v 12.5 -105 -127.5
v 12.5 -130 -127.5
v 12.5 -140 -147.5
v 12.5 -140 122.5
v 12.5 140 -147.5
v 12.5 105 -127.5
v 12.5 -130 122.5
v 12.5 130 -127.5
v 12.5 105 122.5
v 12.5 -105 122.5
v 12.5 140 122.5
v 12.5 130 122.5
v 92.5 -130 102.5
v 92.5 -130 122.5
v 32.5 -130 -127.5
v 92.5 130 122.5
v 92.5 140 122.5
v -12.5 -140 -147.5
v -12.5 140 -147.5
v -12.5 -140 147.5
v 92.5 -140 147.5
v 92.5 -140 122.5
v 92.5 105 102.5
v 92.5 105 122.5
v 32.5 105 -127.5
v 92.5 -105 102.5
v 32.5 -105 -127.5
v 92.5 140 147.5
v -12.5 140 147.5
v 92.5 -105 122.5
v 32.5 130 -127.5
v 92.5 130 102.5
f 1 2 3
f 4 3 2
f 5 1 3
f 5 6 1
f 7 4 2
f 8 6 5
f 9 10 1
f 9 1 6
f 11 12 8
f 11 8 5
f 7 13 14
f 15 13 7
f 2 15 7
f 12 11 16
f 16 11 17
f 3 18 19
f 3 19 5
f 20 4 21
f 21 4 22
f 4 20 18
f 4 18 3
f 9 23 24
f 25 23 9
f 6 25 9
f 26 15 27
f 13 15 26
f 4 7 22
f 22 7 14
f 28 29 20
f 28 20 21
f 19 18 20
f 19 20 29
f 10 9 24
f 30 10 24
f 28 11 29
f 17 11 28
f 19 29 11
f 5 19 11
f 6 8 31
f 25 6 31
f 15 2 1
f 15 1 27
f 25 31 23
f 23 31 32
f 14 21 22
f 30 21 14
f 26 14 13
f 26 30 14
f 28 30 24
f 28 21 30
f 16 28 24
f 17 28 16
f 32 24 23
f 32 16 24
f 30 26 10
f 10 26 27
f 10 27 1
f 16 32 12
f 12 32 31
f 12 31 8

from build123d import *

# Parameters (mm, degrees)
SKETCH_1_W      = 25
SKETCH_1_H      = 280
EXTRUDE_1_DEPTH = 147.5
SKETCH_2_W      = 80
SKETCH_2_H      = 25
EXTRUDE_2_DEPTH = 280
EXTRUDE_3_DEPTH = 25


with BuildPart() as part:
    # 草图1 → 凸台-拉伸1 (new, symmetric)
    with BuildSketch(Plane.XY):
        Rectangle(SKETCH_1_W, SKETCH_1_H)
    extrude(amount=EXTRUDE_1_DEPTH, both=True)

    # 草图2 → 凸台-拉伸2 (add)
    with BuildSketch(Plane(origin=(0, 140, 0), x_dir=(1, 0, 0), z_dir=(0, 1, 0))):
        with Locations((52.5, -135)):
            Rectangle(SKETCH_2_W, SKETCH_2_H)
    extrude(amount=-EXTRUDE_2_DEPTH)

    # 草图4 → 凸台-拉伸3 (add)
    with BuildSketch(Plane(origin=(0, 130, 0), x_dir=(1, 0, 0), z_dir=(0, 1, 0))):
        Polygon((12.5, 127.5), (32.5, 127.5), (92.5, -102.5), (92.5, -122.5), (12.5, -122.5), align=None)
    extrude_3 = extrude(amount=-EXTRUDE_3_DEPTH)

    # 镜向1: 凸台-拉伸3 across plane
    add(extrude_3.mirror(Plane.ZX))


solid = part.part
